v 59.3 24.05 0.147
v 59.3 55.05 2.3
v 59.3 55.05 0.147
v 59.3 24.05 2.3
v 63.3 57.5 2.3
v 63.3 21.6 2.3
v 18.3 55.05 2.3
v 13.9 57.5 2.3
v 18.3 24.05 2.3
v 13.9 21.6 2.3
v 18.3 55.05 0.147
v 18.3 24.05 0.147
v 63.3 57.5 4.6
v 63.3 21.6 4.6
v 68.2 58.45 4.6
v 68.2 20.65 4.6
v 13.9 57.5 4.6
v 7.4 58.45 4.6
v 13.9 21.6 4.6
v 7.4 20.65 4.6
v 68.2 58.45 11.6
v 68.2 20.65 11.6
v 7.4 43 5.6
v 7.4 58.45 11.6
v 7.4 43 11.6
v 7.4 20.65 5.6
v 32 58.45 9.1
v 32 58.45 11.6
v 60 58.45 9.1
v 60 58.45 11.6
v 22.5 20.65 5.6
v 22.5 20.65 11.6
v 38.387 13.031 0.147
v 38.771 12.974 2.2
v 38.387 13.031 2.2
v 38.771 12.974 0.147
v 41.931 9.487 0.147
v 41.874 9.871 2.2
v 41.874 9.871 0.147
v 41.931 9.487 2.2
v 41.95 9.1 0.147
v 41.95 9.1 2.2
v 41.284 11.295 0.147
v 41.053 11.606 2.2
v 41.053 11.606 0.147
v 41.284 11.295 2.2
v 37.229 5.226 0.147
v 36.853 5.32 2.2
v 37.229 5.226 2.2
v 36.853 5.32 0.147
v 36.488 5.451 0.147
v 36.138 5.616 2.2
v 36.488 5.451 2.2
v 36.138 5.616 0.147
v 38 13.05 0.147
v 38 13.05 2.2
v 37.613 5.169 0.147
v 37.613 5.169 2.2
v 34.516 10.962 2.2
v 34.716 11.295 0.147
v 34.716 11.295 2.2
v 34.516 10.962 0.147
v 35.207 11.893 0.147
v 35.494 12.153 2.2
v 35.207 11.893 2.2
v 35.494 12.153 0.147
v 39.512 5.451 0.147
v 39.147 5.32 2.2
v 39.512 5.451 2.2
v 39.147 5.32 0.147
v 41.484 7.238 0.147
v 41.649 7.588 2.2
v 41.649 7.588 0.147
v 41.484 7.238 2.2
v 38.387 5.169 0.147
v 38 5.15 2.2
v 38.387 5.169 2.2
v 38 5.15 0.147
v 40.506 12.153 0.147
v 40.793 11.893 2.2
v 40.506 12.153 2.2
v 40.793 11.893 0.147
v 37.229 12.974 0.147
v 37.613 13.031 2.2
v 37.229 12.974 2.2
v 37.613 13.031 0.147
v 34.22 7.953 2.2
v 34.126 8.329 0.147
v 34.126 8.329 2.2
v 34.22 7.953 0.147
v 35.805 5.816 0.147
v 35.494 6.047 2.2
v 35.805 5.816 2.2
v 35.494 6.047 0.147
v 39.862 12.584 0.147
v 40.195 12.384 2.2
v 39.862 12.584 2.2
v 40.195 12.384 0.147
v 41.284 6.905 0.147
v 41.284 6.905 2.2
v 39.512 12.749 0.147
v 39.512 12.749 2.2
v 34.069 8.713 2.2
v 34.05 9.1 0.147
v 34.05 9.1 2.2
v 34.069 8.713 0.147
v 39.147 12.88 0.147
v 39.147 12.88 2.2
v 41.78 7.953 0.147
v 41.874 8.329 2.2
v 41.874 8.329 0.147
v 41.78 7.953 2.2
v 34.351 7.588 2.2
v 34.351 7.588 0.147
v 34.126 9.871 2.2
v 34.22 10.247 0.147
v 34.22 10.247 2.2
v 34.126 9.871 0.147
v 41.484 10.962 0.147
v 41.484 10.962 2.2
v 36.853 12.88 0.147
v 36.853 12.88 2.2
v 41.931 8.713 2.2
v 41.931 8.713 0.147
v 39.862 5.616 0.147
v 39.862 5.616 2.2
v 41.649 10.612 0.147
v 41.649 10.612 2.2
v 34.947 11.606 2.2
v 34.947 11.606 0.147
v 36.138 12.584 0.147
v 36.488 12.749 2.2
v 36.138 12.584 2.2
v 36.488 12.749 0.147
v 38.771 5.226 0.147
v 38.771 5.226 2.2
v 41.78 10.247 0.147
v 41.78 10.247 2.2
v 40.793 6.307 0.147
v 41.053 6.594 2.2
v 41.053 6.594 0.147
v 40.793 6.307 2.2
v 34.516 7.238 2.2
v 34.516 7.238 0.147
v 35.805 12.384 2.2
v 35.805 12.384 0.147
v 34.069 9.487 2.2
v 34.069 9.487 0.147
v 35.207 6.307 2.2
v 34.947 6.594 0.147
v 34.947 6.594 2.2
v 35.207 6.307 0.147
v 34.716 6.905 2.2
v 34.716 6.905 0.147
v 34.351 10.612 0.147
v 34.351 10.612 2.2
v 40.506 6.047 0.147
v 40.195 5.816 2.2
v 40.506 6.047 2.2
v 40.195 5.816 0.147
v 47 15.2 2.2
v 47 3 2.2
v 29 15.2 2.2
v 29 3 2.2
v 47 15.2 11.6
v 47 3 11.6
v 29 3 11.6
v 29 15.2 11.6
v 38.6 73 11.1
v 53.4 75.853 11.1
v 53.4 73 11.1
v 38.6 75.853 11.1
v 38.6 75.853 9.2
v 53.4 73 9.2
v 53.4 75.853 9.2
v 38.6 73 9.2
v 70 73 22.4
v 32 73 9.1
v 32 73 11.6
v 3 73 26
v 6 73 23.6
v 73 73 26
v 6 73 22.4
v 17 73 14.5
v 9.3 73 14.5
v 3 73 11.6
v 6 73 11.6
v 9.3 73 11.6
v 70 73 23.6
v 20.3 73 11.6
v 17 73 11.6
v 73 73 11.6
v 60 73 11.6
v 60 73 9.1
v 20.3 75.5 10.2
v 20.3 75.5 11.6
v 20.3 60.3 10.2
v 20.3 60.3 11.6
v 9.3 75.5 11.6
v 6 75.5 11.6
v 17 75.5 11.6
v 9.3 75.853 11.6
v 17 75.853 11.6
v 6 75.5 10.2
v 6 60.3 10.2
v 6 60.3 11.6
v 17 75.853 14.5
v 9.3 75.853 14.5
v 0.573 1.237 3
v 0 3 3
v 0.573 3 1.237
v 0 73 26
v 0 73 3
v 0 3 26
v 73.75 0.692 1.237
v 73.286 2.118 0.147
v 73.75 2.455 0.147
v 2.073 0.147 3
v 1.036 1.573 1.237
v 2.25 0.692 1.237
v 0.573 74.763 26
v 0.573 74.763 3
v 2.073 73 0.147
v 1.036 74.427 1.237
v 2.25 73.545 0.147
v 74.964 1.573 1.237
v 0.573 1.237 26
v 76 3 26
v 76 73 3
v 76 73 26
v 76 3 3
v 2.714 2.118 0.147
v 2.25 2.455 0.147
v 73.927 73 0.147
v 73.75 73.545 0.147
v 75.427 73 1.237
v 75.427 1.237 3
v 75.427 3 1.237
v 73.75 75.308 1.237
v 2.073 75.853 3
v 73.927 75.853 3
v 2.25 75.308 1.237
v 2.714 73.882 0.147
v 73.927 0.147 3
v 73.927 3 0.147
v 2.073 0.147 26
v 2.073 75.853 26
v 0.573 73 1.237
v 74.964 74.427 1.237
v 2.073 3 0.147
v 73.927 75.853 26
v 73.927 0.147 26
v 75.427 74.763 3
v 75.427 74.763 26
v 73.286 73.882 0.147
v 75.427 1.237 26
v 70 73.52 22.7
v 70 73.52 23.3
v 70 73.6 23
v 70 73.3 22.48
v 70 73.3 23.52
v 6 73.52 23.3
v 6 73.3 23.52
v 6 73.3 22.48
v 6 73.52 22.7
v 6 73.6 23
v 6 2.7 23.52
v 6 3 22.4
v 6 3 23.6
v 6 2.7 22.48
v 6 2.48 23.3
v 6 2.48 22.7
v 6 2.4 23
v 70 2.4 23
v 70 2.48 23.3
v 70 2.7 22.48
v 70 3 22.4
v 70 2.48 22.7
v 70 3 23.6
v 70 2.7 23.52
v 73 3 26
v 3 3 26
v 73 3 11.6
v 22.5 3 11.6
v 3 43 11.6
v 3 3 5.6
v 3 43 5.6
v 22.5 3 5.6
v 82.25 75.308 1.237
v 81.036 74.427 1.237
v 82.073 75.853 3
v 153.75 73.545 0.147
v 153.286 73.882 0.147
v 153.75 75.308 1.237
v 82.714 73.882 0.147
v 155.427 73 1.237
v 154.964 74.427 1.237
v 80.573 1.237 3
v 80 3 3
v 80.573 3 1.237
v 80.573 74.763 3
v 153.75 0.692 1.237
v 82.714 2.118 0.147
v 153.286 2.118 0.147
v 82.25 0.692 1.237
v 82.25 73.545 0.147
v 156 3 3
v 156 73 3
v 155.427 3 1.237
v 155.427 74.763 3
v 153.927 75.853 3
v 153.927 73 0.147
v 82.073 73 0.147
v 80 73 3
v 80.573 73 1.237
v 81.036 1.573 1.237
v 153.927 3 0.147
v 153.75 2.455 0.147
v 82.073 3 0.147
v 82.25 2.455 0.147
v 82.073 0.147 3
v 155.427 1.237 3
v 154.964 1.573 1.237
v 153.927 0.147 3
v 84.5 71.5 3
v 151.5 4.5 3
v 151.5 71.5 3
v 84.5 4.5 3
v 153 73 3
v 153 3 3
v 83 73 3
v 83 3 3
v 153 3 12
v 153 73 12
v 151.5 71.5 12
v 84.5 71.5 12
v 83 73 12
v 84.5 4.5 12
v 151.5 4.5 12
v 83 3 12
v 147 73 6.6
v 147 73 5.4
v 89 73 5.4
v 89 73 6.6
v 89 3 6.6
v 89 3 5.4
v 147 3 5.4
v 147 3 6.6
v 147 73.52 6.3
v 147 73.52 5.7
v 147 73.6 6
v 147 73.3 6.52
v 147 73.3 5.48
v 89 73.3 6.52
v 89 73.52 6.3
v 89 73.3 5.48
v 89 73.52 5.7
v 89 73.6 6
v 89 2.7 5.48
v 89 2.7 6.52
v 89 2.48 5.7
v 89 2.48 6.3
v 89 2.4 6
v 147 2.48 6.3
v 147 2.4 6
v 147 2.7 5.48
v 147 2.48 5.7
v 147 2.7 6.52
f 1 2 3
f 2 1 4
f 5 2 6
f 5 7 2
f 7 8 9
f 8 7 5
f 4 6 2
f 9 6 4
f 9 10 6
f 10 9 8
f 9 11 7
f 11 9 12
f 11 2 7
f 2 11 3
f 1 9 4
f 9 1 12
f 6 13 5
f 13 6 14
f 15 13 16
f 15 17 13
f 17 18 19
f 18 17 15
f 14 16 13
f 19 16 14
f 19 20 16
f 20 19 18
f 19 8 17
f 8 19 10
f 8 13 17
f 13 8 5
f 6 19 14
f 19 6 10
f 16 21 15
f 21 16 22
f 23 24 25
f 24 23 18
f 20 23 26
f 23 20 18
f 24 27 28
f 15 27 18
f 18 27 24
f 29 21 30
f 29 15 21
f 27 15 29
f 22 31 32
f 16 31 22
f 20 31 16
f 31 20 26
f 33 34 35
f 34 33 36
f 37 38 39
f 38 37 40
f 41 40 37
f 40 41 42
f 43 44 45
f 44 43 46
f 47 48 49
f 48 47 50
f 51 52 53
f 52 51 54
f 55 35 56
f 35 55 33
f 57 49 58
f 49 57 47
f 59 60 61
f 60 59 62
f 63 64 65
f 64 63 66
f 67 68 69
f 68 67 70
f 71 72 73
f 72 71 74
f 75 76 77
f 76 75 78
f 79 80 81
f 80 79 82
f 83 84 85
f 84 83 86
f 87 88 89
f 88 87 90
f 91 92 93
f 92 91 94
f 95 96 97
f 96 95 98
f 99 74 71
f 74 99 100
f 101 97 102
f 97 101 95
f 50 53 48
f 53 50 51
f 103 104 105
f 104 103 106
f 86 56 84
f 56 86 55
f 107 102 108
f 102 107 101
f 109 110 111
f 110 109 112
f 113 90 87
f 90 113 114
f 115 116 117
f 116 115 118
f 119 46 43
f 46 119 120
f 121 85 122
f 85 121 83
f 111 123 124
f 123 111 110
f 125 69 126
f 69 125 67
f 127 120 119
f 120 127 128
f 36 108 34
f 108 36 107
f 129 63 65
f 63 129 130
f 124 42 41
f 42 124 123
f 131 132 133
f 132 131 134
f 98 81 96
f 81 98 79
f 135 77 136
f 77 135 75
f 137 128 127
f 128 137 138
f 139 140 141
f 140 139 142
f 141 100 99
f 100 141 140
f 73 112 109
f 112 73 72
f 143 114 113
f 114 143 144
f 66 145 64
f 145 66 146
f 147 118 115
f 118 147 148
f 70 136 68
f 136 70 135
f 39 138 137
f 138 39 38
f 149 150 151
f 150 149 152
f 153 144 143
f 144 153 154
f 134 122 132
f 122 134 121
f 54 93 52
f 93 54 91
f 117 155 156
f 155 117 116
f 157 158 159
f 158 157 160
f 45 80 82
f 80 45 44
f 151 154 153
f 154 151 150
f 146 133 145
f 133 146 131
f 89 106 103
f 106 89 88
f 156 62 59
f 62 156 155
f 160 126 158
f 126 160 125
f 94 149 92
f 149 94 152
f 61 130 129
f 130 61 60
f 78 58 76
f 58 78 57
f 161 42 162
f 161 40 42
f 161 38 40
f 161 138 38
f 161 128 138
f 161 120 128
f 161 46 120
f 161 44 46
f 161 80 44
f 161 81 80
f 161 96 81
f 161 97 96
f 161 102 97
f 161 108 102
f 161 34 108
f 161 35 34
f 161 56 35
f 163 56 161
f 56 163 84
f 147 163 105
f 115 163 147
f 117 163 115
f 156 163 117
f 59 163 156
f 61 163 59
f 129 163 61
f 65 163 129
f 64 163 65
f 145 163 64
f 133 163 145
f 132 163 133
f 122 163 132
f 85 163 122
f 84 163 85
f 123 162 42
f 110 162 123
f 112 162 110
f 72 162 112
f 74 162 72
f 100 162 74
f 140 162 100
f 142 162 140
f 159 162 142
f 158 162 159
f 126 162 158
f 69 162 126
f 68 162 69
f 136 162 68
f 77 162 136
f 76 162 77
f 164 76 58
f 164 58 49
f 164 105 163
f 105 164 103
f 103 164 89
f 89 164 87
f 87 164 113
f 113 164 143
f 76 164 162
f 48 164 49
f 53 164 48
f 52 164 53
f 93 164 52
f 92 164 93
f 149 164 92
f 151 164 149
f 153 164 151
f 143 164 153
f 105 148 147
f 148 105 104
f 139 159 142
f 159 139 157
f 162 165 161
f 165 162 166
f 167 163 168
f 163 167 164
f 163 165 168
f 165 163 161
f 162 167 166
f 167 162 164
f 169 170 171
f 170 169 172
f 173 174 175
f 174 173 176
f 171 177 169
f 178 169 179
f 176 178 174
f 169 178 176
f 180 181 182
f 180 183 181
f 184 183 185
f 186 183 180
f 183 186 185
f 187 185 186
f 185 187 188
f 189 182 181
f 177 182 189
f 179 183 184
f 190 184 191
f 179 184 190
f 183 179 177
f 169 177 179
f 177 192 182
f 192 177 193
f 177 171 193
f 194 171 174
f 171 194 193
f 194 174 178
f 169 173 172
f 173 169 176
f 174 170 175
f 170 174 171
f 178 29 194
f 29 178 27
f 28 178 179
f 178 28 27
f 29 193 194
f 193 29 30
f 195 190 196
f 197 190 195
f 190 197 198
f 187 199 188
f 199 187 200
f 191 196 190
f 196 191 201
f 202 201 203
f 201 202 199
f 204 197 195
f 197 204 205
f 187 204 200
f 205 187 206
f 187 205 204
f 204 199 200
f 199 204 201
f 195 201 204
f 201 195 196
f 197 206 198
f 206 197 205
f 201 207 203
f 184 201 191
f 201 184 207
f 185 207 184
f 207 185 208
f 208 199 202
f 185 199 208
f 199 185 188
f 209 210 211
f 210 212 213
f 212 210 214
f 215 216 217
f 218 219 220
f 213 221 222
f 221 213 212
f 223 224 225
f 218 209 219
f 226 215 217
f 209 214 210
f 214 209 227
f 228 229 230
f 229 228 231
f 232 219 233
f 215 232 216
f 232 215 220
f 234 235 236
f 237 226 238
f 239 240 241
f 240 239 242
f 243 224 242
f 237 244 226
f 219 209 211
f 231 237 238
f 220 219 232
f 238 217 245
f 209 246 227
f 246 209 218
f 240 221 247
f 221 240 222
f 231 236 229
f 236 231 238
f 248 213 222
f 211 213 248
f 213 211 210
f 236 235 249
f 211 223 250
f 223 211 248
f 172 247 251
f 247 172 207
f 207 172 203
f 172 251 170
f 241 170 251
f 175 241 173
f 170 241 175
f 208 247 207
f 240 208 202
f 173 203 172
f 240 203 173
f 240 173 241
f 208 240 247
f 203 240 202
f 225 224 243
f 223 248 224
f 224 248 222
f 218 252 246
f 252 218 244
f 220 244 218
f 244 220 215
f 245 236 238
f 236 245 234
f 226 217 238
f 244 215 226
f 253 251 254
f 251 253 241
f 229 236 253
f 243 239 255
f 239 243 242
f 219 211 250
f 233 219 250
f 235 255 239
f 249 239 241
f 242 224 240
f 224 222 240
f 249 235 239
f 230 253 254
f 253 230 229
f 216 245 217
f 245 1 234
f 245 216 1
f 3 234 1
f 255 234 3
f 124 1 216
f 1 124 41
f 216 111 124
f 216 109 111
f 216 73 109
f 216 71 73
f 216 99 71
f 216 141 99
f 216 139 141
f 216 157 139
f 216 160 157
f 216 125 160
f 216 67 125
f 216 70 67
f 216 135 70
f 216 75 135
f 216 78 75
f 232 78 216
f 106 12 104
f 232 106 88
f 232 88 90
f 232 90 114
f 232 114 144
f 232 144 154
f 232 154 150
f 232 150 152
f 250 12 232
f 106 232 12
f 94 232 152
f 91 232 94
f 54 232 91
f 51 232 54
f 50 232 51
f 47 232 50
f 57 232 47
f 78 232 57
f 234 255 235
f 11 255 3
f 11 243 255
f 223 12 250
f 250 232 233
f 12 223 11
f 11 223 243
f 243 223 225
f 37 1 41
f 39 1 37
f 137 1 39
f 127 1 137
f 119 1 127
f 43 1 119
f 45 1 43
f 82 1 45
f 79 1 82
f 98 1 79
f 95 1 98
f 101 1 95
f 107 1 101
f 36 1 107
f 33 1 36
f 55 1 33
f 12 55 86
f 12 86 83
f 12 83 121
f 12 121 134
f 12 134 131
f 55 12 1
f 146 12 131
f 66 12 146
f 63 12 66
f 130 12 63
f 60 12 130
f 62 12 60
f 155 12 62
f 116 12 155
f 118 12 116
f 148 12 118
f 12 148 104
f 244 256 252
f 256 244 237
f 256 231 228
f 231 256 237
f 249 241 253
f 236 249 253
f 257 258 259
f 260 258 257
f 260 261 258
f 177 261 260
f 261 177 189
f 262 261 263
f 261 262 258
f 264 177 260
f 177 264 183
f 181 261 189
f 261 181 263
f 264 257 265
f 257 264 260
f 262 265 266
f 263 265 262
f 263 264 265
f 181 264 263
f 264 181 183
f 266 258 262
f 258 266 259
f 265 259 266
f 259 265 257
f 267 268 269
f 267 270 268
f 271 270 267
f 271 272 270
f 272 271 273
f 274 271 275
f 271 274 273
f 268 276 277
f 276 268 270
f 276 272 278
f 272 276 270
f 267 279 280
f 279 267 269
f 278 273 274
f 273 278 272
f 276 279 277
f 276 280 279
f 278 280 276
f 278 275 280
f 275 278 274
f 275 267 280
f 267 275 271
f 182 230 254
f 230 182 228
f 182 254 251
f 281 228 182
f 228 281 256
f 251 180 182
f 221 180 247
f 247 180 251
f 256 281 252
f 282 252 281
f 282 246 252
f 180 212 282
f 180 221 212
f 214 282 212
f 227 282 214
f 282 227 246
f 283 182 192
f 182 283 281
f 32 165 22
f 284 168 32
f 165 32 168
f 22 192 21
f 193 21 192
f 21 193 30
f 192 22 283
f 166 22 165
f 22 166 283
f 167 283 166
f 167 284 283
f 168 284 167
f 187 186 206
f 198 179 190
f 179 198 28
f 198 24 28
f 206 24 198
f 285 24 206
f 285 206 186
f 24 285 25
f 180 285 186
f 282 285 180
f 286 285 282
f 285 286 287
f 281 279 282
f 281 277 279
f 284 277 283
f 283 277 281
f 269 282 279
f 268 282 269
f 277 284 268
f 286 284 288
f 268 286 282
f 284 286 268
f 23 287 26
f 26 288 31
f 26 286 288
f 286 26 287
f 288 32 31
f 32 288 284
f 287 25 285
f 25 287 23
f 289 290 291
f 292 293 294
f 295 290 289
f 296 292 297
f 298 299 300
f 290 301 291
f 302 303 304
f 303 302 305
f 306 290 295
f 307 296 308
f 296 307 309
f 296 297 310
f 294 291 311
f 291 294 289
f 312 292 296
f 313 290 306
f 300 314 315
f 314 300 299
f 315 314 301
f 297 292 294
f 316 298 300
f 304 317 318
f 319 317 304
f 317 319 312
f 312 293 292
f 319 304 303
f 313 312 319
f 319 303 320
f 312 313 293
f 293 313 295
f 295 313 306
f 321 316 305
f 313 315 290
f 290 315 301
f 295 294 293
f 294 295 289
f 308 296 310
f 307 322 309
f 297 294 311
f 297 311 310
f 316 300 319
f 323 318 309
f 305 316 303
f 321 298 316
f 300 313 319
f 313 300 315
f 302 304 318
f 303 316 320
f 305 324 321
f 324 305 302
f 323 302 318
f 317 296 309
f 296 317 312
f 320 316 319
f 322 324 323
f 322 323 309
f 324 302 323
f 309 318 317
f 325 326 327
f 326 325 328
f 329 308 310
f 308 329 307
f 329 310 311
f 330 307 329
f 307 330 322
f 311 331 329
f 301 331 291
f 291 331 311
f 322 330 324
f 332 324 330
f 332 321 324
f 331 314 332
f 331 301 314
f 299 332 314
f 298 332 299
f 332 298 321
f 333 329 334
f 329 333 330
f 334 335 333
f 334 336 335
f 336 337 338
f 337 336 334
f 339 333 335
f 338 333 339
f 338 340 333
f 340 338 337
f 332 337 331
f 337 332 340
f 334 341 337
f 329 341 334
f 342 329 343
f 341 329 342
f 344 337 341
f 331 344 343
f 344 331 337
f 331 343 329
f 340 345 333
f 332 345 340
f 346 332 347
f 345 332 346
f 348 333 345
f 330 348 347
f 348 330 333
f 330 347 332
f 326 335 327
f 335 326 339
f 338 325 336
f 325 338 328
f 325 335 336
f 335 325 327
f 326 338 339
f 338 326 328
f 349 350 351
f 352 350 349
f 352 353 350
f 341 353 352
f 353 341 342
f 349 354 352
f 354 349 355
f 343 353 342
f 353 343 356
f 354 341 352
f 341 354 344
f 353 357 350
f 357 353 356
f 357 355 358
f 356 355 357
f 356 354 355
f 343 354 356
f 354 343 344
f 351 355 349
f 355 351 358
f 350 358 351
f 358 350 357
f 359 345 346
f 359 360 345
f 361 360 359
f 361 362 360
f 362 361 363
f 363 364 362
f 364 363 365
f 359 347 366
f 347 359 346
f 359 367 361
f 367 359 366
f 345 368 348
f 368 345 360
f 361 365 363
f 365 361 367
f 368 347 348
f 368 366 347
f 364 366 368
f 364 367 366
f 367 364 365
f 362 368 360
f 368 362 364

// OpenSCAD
//screen
visiblel    = 41;
visiblew    = 31;

visibleconnecto = 4.4; // offset from physicaledge at the connectorside
visibletopo     = 1.6;

physicall   = 49.2+0.2;
physicalw   = 35.7+0.2;
physicalh   = 2.3;

physicalconnecto = 6.5; // offset from the screen where the screen connector is to the side of the pcs
physicaltopo     = 5.6; // offsetfrom the side with the pcb connector to the side of the screen
physicalsideo    = 1.5; // actually 1.5 and 1.8

pcbl        = 60.6 +0.2;
pcbw        = 37.6 +0.2;
pcbh        = 1.6  +0.2;

conl        = 2.5;
conw        = 22+1;
conh        = 12.8 - pcbh;
cono        = 8.0;

//switch
swknobd     = 5.4 + 0.2;
swknobh     = 2.5;
swringd     = 7.7 + 0.2;
swringh     = 2.2;
swl         = 18.0;
swminl      = 12.3;
swminw      =  5.2;
sww         = 12.2;
swh         = 4.5;

//esp
esppcbl        = 51;
esppcbw        = 28;
esppcbh        = 1.6; 

espantl        = 6.8;
espantw        = 18+0.2;
espanth        = 1;
espanto        = 4.9;

espl           = 18.7;
esph           = 4.9 - esppcbh;

espsdl         = 3.4;
espsdw         = 14.8;
espsdh         = 1.9;
espsdo         = 6.6;

esptopcomph    = 9.9 - esppcbh;
espbotcomph    = 2.0;

//lipo
lipow       = 19.5;
lipol       = 40;
lipoh       = 7.8;

//usb

usbl        = 14.1+0.2;
usbw        = 15.0+0.2;
usbconl     = 7.5+0.2;
usbconw     = 5.5;
usbcone     = 1.0; // sticks 1 mm out over the edge
usbpcbh     = 1.4;
usbconh     = 4.0 - usbpcbh + 0.3;
usbcono     = 3.4 - 0.1;

cushion     = 5;

ww      = 2;
h       = 23;
w       = 70;
l       = 70;
r       = 3;
clickd  = 1.2; 

module usb(){
    color("green")
    cube([ usbl, usbw, usbpcbh]);
    
    color("grey")
    translate([ usbcono, usbw - usbconw + usbcone, usbpcbh])
        cube([ usbconl, usbconw, usbconh]);
    
}    

module lipo(){
    color("purple", 0.6)    
        cube([ lipol, lipow, lipoh] );    
}    


module esp(){
    
    color("grey")
    translate([ esppcbl, espsdo,espbotcomph - espsdh])
        cube([ espsdl, espsdw, espsdh]);   

    color("yellow",0.3)
        cube([ esppcbl, esppcbw, espbotcomph]);
    
    
    //pcb
    color("green")
    translate([0,0,espbotcomph])
        cube([ esppcbl, esppcbw, esppcbh]);   
    
    //top components
    color("yellow",0.3)
       translate([0,0,espbotcomph + esppcbh])
        cube([ esppcbl, esppcbw, esptopcomph]);
    // antenna
    color("red",0.7)
       translate([ -espantl, espanto,espbotcomph + esppcbh])
            cube([ espantl, espantw, espanth] );
    //esp32
    color("white",0.9)
       translate([ 0, espanto,espbotcomph + esppcbh])
            cube([ espl, espantw, esph] );
    
    
    
}    


module screen(){
    color("blue",0.2)
    cube( [visiblel, visiblew, 10] );
    
    translate( [-visibleconnecto, -(physicalw-visiblew)/2, 10] )
        color("white")
        cube( [physicall, physicalw, physicalh ]);
    
    
    translate( [-visibleconnecto - physicalconnecto, -(physicalw-visiblew)/2-(pcbw-physicalw)/2, 10 + physicalh] )
        color("green",0.8)
        cube( [pcbl, pcbw, pcbh + 1]);
   


    translate( [-visibleconnecto - physicalconnecto + pcbl - conl , -(physicalw-visiblew)/2-(pcbw-physicalw)/2 + cono, 10 + physicalh + pcbh] )
        cube([ conl, conw,conh]);
    
     
    translate( [-visibleconnecto - physicalconnecto, -(physicalw-visiblew)/2-(pcbw-physicalw)/2, 10 + physicalh +pcbh+1] )
        color("blue",0.1)
        cube( [pcbl, pcbw, pcbh + cushion]);
        
}    

module switch(){
    
        color("blue", 0.2 )
            cylinder( d= swknobd, h=swknobh);
        
        color("red")
            translate([0,0,swknobh])
                cylinder( d= swringd, h=swringh, $fn=64);
    
        color("black",0.9)
        translate([0,0,swknobh + swringh + swh/2])
            cube([ swl, sww,swh], center=true);
      
        color("blue",0.1)        
        translate([0,0,swknobh + swringh + swh/2 + swh])
            cube([ swl, sww, cushion + 6], center=true);
    
}



module box(){
  translate([ r, r,r]){      
    difference(){
    
    //cube( [l+2*ww,w+2*ww,h+2*ww ]); 
      
        hull(){    
        translate( [0,0,0] )
            sphere( r );   
        translate( [l,0,0] )
            sphere( r );    
        translate( [l,w, 0])
            sphere( r );    
        translate( [0,w,0 ])
            sphere( r );
    
        translate( [0,0,h] )
            sphere( r );   
        translate( [l,0,h] )
            sphere( r );    
        translate( [l,w, h])
            sphere( r );    
        translate( [0,w,h] )
            sphere( r );
       }    

       //clicks only on the l sides
       
       translate([ r,  w, h - r ])
        rotate([0,90,0])
         cylinder(d=clickd,h=l-2*r,$fn=12);
     
    
       translate([ r,0, h - r ])
        rotate([0,90,0])
         cylinder(d=clickd,h=l-2*r,$fn=12);
      
       //cut off top 
      translate( [-r,-r,h])
        cube( [ l+2*r, w+2*r, r] );               

    
        //  innerbox thicker bottom
        translate( [0,0,pcbh*2 + cushion] ) 
            cube( [l,w,h+ww] ); // +ww to h to make a hole
    
       
    translate( [ (l - (pcbl/2))/2 - r -r/2, (w-pcbw/2)/2 -r - r/2, -10 + physicalh -r] )
    screen();
   
    translate( [ l/2, sww/2, -swknobh -r] )
        switch();
    
    translate( [  l/2 -2*r, w - esppcbl, physicalh + pcbh + 2 ] )
    translate([ esppcbw,0,0] )
        rotate( [ 0,0,90 ])
            esp();

    translate( [0, 0, pcbh*2 + 2 -r] )
    translate([ lipow,0,0] )
        rotate( [ 0,0,90 ])
            lipo();

    translate([ r , w +r- usbw -usbcone/2,pcbh*2-usbpcbh +cushion])
        usb();

    }

}  
}
 

module lid(){
 
    translate([ r, r,r]){  
        difference(){
            
           hull(){    
            translate( [0,0,0] )
                sphere( r );   
            translate( [l,0,0] )
                sphere( r );    
            translate( [l,w, 0])
                sphere( r );    
            translate( [0,w,0 ])
                sphere( r );
           }
           
           //cut off top 
          translate( [-r,-r, 0])
            cube( [ l+2*r, w+2*r, r] );               
         

       }
       
       //inner rim
       difference(){ 
            cube([l,w,r*3]); 
               
            translate( [r/2,r/2,0 ] )cube([l-r,w-r,r*3]); 
               
           
 
        
      }
            //clicks only on the l sides
           
       translate([ 2*r,  w, r ])
        rotate([0,90,0])
         cylinder(d=clickd,h=l-4*r,$fn=12);
         
        
       translate([ 2*r,0, r ])
        rotate([0,90,0])
         cylinder(d=clickd,h=l-4*r,$fn=12);
  }
}    


box();
translate([l +10,0,0])
    lid();


/*
      translate( [ (l - (pcbl/2))/2 -ww/2, (w-pcbw/2)/2 -ww , -10 + physicalh] )
    screen();
   
    translate( [ ww +l/2, sww -ww, -swknobh ] )
        switch();
    
    translate( [  l/2-2*ww, ww + w - ( esppcbl), ww+pcbh*2 + 2] )
    translate([ esppcbw,0,0] )
        rotate( [ 0,0,90 ])
            esp();

    translate( [ww+1, ww , ww+pcbh*2 + 2] )
    translate([ lipow,0,0] )
        rotate( [ 0,0,90 ])
            lipo();

    translate([ 2*ww, 2*ww + w - usbw -usbcone/2,ww+pcbh*2-usbpcbh +cushion])
        usb();
*/
